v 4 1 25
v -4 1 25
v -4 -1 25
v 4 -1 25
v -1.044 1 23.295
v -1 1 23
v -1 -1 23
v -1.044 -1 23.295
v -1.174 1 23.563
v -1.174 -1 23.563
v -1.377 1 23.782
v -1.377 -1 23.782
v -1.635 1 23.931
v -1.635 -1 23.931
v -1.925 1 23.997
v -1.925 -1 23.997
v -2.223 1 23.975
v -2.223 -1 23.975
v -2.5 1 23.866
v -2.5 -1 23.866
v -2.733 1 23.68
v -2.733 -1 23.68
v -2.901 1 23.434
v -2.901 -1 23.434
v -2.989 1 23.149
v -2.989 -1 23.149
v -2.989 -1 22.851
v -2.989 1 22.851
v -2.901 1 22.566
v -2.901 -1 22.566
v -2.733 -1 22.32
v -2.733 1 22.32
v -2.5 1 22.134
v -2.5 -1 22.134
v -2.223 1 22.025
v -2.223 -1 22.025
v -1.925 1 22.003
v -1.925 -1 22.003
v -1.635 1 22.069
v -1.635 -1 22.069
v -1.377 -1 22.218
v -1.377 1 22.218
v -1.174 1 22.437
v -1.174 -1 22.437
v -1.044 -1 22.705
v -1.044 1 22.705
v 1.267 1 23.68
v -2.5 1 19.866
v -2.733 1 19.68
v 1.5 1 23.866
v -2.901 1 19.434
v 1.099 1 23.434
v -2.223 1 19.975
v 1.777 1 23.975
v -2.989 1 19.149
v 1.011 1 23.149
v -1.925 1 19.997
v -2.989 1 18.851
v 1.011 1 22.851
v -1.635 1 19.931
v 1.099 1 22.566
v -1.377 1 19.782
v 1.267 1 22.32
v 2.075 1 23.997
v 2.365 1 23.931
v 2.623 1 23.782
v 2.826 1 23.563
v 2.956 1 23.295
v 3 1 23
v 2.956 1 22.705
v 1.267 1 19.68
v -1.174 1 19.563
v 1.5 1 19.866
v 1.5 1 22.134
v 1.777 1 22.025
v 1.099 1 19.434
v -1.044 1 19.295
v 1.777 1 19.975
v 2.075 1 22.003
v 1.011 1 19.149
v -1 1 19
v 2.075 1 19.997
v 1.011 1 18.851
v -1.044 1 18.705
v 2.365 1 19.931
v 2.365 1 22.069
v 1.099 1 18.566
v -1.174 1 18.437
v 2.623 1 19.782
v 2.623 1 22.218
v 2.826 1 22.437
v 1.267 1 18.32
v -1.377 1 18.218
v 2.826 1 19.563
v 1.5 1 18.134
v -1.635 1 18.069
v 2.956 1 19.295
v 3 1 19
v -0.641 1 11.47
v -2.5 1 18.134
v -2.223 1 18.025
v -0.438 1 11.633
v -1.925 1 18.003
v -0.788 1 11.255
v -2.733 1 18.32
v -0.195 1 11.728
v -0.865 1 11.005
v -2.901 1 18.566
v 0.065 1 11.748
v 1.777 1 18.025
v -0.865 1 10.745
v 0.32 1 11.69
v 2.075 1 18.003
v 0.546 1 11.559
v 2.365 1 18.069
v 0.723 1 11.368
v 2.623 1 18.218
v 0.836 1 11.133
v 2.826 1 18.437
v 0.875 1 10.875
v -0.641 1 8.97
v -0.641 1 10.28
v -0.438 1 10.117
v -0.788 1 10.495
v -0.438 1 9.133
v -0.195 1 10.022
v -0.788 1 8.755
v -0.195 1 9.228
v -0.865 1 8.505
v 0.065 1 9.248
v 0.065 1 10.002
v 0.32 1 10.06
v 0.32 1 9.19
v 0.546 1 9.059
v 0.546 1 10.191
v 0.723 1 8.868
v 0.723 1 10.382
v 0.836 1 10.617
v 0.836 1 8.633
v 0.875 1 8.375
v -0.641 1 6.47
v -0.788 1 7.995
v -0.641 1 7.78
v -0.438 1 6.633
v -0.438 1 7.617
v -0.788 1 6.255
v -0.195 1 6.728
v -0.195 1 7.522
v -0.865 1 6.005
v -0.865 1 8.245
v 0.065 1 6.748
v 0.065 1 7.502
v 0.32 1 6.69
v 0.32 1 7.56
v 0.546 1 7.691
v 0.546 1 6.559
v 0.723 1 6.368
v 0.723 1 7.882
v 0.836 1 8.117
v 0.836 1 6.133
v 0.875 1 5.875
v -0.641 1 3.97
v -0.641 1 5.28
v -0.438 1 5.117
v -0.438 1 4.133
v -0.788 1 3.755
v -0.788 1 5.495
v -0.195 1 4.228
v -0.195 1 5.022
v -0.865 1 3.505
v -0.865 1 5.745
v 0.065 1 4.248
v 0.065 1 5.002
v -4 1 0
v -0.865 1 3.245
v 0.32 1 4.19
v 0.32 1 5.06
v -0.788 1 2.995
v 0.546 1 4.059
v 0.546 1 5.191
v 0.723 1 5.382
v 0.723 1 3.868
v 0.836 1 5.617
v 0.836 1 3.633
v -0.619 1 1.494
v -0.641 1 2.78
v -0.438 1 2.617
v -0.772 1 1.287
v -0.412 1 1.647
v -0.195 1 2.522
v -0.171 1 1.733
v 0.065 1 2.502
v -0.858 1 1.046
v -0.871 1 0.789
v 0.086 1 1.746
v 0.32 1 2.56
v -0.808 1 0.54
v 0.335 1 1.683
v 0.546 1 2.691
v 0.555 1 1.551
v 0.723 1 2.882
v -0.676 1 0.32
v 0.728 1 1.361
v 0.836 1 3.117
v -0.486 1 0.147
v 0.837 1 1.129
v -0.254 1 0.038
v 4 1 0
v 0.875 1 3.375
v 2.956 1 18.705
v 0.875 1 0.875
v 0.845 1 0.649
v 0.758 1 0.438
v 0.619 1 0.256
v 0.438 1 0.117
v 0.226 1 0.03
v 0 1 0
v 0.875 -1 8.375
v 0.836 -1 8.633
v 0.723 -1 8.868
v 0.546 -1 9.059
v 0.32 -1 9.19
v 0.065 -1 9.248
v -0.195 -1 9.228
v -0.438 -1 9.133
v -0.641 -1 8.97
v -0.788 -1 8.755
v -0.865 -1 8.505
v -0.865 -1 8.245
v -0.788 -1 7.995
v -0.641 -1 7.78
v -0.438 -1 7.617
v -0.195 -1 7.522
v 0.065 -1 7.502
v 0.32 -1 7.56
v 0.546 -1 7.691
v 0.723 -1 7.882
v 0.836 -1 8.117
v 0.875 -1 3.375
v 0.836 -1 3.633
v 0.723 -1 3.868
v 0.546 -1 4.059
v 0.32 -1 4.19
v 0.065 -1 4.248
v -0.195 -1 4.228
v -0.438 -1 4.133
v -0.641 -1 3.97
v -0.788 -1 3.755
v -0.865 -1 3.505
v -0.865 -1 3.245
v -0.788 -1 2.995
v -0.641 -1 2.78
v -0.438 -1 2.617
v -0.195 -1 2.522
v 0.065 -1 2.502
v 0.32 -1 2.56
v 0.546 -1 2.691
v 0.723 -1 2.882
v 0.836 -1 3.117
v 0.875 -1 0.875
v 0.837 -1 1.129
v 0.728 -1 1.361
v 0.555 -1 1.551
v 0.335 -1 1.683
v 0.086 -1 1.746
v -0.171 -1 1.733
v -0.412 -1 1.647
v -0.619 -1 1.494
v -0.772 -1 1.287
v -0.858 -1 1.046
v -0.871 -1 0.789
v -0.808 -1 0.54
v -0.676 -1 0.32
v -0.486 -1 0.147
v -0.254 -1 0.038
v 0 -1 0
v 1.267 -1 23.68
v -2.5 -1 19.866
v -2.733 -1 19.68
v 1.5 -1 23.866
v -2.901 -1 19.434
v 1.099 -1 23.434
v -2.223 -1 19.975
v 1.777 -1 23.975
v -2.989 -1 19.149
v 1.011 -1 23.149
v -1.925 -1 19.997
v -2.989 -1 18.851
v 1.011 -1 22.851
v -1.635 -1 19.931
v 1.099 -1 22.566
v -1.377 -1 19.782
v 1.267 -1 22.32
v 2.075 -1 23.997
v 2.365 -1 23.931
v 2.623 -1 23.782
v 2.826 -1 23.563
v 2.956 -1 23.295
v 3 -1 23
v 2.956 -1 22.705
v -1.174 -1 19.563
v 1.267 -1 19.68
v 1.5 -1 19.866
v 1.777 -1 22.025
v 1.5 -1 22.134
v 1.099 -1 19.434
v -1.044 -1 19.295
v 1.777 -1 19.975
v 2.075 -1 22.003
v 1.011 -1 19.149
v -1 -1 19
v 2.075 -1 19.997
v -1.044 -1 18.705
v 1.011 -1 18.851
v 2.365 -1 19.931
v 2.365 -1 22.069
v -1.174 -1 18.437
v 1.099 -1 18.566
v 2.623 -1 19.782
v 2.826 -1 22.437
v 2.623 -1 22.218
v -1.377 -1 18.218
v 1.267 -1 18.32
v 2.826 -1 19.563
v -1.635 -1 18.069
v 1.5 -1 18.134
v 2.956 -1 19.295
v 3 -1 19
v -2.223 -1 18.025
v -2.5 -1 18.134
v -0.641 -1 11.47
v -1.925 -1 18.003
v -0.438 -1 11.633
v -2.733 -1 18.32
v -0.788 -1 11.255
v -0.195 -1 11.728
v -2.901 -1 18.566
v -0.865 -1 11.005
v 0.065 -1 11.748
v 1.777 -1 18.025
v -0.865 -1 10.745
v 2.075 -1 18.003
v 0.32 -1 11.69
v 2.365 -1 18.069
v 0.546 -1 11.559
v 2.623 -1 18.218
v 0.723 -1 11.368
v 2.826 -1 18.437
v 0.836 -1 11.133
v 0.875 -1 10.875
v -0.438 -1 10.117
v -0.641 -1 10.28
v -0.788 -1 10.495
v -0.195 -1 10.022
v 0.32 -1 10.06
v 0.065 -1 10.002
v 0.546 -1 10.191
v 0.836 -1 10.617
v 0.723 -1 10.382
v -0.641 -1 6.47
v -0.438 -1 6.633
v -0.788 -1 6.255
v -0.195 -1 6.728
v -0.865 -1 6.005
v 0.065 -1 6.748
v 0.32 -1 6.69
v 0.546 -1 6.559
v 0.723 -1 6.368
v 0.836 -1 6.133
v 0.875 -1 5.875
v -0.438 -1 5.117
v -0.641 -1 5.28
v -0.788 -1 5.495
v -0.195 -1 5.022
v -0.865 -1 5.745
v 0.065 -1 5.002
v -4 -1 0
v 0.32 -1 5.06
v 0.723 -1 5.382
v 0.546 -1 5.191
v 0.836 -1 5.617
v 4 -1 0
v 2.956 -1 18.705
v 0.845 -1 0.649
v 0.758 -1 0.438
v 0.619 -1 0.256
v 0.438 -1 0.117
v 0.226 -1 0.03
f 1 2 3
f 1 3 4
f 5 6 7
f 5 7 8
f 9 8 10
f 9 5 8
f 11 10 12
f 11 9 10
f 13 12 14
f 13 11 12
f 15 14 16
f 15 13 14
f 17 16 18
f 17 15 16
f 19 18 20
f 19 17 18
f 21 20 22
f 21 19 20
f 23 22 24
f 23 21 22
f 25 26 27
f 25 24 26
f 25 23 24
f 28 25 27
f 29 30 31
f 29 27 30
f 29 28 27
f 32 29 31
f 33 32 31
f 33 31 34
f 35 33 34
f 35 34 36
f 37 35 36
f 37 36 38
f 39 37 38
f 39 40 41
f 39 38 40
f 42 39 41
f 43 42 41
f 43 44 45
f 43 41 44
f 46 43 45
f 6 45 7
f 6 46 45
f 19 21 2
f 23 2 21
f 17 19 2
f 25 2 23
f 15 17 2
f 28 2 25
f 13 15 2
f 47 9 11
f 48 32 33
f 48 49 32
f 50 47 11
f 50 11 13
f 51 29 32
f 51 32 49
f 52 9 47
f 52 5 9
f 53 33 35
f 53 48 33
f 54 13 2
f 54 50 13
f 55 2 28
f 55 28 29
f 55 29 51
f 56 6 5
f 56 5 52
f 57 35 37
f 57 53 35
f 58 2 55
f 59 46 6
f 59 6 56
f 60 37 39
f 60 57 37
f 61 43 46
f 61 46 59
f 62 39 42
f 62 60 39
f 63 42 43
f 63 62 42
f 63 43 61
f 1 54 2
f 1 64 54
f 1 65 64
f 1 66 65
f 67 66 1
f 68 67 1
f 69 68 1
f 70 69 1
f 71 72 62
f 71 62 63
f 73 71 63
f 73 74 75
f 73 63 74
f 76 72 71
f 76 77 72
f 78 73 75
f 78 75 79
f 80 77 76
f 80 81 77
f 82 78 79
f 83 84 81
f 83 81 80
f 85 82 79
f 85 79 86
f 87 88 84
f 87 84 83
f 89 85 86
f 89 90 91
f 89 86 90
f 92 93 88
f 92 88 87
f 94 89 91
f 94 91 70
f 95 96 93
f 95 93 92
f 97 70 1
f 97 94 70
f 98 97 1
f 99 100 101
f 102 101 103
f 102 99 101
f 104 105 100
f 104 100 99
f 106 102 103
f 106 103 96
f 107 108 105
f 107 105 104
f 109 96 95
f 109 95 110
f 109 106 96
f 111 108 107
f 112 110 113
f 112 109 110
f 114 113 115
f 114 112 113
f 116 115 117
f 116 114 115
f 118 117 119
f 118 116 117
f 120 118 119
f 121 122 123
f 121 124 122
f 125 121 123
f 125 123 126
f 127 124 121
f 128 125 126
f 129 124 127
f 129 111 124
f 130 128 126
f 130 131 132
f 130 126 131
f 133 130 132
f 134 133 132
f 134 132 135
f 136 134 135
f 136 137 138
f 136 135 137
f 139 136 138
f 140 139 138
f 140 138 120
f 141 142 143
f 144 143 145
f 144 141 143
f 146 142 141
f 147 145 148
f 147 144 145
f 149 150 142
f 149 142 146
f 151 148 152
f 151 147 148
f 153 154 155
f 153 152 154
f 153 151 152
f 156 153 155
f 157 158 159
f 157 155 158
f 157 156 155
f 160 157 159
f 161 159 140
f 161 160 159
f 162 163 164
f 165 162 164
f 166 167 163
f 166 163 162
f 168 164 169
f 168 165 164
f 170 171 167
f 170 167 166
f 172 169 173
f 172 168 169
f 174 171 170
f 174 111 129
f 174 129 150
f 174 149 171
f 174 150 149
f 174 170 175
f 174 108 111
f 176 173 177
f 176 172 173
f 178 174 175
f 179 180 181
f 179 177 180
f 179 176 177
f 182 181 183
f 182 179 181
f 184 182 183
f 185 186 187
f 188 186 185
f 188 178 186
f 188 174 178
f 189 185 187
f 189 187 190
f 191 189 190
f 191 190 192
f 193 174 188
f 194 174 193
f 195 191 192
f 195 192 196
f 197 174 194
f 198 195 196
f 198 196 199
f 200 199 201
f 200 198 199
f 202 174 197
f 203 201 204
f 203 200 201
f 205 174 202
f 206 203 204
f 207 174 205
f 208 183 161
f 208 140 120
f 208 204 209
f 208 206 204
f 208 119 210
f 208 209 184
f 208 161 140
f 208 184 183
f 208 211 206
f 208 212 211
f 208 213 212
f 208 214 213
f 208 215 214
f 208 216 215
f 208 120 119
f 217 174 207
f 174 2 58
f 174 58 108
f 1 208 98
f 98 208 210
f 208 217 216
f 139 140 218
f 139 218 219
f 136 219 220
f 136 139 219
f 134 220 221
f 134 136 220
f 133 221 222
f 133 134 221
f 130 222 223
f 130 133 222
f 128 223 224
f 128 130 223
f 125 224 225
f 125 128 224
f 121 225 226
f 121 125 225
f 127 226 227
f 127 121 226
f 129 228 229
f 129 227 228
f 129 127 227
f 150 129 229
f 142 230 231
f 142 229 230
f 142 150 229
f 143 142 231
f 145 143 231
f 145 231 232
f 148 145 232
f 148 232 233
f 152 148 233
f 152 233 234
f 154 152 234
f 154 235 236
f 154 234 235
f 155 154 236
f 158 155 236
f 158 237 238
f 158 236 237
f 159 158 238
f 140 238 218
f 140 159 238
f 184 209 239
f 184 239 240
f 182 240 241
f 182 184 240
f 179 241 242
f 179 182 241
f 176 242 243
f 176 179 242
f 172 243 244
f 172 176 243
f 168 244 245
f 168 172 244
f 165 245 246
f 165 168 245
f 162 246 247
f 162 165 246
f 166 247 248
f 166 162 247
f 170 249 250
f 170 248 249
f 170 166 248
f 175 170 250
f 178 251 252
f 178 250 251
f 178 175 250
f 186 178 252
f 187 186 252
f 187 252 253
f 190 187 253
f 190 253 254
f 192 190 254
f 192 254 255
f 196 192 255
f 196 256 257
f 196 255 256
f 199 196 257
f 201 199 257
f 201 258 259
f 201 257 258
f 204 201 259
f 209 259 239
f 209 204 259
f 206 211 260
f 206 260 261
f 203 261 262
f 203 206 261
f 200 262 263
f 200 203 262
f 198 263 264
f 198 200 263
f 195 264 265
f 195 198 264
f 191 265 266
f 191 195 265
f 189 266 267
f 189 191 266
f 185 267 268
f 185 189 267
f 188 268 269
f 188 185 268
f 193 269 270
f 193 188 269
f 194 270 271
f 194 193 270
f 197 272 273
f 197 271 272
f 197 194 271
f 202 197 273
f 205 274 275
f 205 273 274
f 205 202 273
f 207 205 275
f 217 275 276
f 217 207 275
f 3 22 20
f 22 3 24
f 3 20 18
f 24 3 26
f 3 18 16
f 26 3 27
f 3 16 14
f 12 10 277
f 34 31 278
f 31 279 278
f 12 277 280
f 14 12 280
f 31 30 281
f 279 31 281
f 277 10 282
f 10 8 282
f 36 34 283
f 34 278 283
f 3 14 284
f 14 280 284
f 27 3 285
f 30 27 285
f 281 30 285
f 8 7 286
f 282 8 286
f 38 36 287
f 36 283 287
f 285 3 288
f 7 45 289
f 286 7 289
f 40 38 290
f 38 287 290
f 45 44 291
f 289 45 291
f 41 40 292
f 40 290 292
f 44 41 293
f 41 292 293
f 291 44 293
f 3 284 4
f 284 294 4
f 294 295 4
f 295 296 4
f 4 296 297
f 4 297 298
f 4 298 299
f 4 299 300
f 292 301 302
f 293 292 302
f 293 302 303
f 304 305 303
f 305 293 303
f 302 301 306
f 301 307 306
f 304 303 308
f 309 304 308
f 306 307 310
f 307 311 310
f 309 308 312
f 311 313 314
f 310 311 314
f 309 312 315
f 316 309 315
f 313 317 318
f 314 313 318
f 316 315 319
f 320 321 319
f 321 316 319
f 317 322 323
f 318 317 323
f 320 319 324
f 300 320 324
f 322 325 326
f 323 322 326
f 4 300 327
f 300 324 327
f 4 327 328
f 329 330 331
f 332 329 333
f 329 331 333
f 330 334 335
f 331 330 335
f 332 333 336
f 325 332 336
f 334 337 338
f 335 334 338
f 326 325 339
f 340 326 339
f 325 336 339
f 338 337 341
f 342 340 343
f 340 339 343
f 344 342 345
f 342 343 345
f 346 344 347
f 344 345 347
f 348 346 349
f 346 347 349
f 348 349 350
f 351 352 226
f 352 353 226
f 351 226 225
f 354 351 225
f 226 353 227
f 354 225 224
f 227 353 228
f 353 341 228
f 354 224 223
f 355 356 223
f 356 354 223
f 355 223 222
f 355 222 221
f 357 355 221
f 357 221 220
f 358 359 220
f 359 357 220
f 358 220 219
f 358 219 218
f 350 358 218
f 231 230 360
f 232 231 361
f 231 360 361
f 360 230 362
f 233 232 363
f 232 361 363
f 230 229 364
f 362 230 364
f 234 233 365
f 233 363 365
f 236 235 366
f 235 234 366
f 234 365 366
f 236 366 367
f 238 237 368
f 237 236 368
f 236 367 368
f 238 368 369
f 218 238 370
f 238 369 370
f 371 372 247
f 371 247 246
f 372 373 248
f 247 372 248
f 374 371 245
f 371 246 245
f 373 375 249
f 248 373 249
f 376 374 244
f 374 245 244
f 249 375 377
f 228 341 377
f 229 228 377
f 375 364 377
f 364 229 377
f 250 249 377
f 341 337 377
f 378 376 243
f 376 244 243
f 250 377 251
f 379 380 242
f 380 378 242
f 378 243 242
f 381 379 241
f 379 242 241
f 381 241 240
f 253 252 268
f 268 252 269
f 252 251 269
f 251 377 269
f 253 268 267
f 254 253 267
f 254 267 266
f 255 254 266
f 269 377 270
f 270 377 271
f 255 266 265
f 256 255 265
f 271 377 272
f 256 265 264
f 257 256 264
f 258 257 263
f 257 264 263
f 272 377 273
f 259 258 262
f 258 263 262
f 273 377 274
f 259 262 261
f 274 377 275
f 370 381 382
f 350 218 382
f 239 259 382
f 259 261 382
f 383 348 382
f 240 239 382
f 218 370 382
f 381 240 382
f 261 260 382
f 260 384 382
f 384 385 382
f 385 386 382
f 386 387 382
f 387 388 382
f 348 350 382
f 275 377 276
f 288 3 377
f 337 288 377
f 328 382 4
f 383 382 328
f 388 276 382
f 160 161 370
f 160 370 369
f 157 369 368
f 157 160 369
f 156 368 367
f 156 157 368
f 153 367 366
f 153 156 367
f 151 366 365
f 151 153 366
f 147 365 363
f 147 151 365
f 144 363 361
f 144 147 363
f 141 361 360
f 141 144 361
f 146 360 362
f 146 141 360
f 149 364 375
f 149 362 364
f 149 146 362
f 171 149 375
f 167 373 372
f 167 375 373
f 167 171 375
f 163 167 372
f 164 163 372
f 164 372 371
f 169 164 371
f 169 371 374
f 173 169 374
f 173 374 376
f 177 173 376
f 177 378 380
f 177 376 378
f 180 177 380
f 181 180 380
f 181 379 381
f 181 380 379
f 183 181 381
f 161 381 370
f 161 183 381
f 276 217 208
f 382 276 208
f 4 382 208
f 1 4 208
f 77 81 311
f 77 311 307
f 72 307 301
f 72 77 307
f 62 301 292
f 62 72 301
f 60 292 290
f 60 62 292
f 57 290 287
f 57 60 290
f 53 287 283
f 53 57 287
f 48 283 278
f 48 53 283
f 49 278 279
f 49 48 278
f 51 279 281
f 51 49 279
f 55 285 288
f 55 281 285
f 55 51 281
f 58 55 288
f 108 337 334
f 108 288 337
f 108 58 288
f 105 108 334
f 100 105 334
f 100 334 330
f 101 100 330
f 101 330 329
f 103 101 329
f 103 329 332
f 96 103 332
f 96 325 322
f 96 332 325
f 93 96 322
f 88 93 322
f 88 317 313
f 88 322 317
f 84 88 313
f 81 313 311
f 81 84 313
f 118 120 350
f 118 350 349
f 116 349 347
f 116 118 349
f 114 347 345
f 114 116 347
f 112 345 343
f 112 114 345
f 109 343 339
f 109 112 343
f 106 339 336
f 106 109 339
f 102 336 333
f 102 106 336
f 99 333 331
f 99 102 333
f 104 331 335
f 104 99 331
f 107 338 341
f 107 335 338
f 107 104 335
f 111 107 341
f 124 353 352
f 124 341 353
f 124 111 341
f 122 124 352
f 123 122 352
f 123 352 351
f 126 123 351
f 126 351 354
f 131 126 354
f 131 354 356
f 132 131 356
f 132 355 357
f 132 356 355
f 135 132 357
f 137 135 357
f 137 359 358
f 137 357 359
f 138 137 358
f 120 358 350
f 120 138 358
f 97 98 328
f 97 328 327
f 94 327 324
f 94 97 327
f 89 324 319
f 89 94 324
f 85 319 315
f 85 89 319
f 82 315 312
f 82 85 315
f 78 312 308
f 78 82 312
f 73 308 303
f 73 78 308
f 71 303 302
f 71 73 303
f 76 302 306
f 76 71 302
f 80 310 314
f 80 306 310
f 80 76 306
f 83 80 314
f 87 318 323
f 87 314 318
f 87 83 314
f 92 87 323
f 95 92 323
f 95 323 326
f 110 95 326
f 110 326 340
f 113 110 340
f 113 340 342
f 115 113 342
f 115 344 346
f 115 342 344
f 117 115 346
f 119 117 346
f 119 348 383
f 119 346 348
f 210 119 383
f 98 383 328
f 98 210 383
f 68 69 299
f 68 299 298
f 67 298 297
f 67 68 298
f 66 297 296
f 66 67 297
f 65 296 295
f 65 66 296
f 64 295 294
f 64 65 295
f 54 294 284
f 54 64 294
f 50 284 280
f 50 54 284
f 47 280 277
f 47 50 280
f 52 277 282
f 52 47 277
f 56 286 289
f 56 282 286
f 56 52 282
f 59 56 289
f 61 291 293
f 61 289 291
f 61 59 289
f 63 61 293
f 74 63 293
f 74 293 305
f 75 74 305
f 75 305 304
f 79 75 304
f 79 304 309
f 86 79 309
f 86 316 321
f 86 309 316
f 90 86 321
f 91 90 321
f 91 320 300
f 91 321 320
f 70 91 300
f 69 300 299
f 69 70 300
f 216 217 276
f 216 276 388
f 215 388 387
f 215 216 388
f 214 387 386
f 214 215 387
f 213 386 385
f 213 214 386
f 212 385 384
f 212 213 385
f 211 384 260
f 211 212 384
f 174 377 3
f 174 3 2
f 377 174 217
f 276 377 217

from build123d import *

# Parameters (mm, degrees)
CYLINDER019_R     = 1
CYLINDER019_DEPTH = 10
ARRAY022_X_COUNT  = 2
ARRAY022_X_PITCH  = 4
ARRAY022_Z_COUNT  = 2
ARRAY022_Z_PITCH  = 4
CYLINDER018_R     = 0.875
CYLINDER018_DEPTH = 10
ARRAY020_Z_COUNT  = 5
ARRAY020_Z_PITCH  = 2.5
BOX014_W          = 8
BOX014_H          = 2
BOX014_DEPTH      = 25


with BuildPart() as cameramountplaneconnectorscrews:
    # Cylinder019 → Cylinder019 (new body)
    with BuildSketch(Plane(origin=(2, 5, 19), x_dir=(1, 0, 0), z_dir=(0, -1, 0))):
        Circle(CYLINDER019_R)
    extrude(amount=CYLINDER019_DEPTH)

    # Array022 X: CameraMountPlaneConnectorScrews ×2


with BuildPart() as cameramountplaneconnectorscrews_1:
    add(cameramountplaneconnectorscrews.part)
    with Locations(*[(-i * ARRAY022_X_PITCH, 0, 0) for i in range(1, ARRAY022_X_COUNT)]):
        add(cameramountplaneconnectorscrews.part)

    # Array022 Z: CameraMountPlaneConnectorScrews ×2


with BuildPart() as cameramountplaneconnectorscrews_2:
    add(cameramountplaneconnectorscrews_1.part)
    with Locations(*[(0, 0, i * ARRAY022_Z_PITCH) for i in range(1, ARRAY022_Z_COUNT)]):
        add(cameramountplaneconnectorscrews_1.part)


with BuildPart() as servoscrewcutters:
    # Cylinder018 → Cylinder018 (new body)
    with BuildSketch(Plane(origin=(0, 5, 0.875), x_dir=(1, 0, 0), z_dir=(0, -1, 0))):
        Circle(CYLINDER018_R)
    extrude(amount=CYLINDER018_DEPTH)

    # Array020 Z: ServoScrewCutters ×5


with BuildPart() as servoscrewcutters_1:
    add(servoscrewcutters.part)
    with Locations(*[(0, 0, i * ARRAY020_Z_PITCH) for i in range(1, ARRAY020_Z_COUNT)]):
        add(servoscrewcutters.part)


with BuildPart() as cameraservostick2:
    # Box014 → Box014 (new body)
    with BuildSketch(Plane(origin=(-4, -1, 0), x_dir=(1, 0, 0), z_dir=(0, 0, 1))):
        with Locations((4, 1)):
            Rectangle(BOX014_W, BOX014_H)
    extrude(amount=BOX014_DEPTH)

    # Cut040: cut ServoScrewCutters
    add(servoscrewcutters_1.part, mode=Mode.SUBTRACT)

    # Cut041: cut CameraMountPlaneConnectorScrews
    add(cameramountplaneconnectorscrews_2.part, mode=Mode.SUBTRACT)


solid = cameraservostick2.part
